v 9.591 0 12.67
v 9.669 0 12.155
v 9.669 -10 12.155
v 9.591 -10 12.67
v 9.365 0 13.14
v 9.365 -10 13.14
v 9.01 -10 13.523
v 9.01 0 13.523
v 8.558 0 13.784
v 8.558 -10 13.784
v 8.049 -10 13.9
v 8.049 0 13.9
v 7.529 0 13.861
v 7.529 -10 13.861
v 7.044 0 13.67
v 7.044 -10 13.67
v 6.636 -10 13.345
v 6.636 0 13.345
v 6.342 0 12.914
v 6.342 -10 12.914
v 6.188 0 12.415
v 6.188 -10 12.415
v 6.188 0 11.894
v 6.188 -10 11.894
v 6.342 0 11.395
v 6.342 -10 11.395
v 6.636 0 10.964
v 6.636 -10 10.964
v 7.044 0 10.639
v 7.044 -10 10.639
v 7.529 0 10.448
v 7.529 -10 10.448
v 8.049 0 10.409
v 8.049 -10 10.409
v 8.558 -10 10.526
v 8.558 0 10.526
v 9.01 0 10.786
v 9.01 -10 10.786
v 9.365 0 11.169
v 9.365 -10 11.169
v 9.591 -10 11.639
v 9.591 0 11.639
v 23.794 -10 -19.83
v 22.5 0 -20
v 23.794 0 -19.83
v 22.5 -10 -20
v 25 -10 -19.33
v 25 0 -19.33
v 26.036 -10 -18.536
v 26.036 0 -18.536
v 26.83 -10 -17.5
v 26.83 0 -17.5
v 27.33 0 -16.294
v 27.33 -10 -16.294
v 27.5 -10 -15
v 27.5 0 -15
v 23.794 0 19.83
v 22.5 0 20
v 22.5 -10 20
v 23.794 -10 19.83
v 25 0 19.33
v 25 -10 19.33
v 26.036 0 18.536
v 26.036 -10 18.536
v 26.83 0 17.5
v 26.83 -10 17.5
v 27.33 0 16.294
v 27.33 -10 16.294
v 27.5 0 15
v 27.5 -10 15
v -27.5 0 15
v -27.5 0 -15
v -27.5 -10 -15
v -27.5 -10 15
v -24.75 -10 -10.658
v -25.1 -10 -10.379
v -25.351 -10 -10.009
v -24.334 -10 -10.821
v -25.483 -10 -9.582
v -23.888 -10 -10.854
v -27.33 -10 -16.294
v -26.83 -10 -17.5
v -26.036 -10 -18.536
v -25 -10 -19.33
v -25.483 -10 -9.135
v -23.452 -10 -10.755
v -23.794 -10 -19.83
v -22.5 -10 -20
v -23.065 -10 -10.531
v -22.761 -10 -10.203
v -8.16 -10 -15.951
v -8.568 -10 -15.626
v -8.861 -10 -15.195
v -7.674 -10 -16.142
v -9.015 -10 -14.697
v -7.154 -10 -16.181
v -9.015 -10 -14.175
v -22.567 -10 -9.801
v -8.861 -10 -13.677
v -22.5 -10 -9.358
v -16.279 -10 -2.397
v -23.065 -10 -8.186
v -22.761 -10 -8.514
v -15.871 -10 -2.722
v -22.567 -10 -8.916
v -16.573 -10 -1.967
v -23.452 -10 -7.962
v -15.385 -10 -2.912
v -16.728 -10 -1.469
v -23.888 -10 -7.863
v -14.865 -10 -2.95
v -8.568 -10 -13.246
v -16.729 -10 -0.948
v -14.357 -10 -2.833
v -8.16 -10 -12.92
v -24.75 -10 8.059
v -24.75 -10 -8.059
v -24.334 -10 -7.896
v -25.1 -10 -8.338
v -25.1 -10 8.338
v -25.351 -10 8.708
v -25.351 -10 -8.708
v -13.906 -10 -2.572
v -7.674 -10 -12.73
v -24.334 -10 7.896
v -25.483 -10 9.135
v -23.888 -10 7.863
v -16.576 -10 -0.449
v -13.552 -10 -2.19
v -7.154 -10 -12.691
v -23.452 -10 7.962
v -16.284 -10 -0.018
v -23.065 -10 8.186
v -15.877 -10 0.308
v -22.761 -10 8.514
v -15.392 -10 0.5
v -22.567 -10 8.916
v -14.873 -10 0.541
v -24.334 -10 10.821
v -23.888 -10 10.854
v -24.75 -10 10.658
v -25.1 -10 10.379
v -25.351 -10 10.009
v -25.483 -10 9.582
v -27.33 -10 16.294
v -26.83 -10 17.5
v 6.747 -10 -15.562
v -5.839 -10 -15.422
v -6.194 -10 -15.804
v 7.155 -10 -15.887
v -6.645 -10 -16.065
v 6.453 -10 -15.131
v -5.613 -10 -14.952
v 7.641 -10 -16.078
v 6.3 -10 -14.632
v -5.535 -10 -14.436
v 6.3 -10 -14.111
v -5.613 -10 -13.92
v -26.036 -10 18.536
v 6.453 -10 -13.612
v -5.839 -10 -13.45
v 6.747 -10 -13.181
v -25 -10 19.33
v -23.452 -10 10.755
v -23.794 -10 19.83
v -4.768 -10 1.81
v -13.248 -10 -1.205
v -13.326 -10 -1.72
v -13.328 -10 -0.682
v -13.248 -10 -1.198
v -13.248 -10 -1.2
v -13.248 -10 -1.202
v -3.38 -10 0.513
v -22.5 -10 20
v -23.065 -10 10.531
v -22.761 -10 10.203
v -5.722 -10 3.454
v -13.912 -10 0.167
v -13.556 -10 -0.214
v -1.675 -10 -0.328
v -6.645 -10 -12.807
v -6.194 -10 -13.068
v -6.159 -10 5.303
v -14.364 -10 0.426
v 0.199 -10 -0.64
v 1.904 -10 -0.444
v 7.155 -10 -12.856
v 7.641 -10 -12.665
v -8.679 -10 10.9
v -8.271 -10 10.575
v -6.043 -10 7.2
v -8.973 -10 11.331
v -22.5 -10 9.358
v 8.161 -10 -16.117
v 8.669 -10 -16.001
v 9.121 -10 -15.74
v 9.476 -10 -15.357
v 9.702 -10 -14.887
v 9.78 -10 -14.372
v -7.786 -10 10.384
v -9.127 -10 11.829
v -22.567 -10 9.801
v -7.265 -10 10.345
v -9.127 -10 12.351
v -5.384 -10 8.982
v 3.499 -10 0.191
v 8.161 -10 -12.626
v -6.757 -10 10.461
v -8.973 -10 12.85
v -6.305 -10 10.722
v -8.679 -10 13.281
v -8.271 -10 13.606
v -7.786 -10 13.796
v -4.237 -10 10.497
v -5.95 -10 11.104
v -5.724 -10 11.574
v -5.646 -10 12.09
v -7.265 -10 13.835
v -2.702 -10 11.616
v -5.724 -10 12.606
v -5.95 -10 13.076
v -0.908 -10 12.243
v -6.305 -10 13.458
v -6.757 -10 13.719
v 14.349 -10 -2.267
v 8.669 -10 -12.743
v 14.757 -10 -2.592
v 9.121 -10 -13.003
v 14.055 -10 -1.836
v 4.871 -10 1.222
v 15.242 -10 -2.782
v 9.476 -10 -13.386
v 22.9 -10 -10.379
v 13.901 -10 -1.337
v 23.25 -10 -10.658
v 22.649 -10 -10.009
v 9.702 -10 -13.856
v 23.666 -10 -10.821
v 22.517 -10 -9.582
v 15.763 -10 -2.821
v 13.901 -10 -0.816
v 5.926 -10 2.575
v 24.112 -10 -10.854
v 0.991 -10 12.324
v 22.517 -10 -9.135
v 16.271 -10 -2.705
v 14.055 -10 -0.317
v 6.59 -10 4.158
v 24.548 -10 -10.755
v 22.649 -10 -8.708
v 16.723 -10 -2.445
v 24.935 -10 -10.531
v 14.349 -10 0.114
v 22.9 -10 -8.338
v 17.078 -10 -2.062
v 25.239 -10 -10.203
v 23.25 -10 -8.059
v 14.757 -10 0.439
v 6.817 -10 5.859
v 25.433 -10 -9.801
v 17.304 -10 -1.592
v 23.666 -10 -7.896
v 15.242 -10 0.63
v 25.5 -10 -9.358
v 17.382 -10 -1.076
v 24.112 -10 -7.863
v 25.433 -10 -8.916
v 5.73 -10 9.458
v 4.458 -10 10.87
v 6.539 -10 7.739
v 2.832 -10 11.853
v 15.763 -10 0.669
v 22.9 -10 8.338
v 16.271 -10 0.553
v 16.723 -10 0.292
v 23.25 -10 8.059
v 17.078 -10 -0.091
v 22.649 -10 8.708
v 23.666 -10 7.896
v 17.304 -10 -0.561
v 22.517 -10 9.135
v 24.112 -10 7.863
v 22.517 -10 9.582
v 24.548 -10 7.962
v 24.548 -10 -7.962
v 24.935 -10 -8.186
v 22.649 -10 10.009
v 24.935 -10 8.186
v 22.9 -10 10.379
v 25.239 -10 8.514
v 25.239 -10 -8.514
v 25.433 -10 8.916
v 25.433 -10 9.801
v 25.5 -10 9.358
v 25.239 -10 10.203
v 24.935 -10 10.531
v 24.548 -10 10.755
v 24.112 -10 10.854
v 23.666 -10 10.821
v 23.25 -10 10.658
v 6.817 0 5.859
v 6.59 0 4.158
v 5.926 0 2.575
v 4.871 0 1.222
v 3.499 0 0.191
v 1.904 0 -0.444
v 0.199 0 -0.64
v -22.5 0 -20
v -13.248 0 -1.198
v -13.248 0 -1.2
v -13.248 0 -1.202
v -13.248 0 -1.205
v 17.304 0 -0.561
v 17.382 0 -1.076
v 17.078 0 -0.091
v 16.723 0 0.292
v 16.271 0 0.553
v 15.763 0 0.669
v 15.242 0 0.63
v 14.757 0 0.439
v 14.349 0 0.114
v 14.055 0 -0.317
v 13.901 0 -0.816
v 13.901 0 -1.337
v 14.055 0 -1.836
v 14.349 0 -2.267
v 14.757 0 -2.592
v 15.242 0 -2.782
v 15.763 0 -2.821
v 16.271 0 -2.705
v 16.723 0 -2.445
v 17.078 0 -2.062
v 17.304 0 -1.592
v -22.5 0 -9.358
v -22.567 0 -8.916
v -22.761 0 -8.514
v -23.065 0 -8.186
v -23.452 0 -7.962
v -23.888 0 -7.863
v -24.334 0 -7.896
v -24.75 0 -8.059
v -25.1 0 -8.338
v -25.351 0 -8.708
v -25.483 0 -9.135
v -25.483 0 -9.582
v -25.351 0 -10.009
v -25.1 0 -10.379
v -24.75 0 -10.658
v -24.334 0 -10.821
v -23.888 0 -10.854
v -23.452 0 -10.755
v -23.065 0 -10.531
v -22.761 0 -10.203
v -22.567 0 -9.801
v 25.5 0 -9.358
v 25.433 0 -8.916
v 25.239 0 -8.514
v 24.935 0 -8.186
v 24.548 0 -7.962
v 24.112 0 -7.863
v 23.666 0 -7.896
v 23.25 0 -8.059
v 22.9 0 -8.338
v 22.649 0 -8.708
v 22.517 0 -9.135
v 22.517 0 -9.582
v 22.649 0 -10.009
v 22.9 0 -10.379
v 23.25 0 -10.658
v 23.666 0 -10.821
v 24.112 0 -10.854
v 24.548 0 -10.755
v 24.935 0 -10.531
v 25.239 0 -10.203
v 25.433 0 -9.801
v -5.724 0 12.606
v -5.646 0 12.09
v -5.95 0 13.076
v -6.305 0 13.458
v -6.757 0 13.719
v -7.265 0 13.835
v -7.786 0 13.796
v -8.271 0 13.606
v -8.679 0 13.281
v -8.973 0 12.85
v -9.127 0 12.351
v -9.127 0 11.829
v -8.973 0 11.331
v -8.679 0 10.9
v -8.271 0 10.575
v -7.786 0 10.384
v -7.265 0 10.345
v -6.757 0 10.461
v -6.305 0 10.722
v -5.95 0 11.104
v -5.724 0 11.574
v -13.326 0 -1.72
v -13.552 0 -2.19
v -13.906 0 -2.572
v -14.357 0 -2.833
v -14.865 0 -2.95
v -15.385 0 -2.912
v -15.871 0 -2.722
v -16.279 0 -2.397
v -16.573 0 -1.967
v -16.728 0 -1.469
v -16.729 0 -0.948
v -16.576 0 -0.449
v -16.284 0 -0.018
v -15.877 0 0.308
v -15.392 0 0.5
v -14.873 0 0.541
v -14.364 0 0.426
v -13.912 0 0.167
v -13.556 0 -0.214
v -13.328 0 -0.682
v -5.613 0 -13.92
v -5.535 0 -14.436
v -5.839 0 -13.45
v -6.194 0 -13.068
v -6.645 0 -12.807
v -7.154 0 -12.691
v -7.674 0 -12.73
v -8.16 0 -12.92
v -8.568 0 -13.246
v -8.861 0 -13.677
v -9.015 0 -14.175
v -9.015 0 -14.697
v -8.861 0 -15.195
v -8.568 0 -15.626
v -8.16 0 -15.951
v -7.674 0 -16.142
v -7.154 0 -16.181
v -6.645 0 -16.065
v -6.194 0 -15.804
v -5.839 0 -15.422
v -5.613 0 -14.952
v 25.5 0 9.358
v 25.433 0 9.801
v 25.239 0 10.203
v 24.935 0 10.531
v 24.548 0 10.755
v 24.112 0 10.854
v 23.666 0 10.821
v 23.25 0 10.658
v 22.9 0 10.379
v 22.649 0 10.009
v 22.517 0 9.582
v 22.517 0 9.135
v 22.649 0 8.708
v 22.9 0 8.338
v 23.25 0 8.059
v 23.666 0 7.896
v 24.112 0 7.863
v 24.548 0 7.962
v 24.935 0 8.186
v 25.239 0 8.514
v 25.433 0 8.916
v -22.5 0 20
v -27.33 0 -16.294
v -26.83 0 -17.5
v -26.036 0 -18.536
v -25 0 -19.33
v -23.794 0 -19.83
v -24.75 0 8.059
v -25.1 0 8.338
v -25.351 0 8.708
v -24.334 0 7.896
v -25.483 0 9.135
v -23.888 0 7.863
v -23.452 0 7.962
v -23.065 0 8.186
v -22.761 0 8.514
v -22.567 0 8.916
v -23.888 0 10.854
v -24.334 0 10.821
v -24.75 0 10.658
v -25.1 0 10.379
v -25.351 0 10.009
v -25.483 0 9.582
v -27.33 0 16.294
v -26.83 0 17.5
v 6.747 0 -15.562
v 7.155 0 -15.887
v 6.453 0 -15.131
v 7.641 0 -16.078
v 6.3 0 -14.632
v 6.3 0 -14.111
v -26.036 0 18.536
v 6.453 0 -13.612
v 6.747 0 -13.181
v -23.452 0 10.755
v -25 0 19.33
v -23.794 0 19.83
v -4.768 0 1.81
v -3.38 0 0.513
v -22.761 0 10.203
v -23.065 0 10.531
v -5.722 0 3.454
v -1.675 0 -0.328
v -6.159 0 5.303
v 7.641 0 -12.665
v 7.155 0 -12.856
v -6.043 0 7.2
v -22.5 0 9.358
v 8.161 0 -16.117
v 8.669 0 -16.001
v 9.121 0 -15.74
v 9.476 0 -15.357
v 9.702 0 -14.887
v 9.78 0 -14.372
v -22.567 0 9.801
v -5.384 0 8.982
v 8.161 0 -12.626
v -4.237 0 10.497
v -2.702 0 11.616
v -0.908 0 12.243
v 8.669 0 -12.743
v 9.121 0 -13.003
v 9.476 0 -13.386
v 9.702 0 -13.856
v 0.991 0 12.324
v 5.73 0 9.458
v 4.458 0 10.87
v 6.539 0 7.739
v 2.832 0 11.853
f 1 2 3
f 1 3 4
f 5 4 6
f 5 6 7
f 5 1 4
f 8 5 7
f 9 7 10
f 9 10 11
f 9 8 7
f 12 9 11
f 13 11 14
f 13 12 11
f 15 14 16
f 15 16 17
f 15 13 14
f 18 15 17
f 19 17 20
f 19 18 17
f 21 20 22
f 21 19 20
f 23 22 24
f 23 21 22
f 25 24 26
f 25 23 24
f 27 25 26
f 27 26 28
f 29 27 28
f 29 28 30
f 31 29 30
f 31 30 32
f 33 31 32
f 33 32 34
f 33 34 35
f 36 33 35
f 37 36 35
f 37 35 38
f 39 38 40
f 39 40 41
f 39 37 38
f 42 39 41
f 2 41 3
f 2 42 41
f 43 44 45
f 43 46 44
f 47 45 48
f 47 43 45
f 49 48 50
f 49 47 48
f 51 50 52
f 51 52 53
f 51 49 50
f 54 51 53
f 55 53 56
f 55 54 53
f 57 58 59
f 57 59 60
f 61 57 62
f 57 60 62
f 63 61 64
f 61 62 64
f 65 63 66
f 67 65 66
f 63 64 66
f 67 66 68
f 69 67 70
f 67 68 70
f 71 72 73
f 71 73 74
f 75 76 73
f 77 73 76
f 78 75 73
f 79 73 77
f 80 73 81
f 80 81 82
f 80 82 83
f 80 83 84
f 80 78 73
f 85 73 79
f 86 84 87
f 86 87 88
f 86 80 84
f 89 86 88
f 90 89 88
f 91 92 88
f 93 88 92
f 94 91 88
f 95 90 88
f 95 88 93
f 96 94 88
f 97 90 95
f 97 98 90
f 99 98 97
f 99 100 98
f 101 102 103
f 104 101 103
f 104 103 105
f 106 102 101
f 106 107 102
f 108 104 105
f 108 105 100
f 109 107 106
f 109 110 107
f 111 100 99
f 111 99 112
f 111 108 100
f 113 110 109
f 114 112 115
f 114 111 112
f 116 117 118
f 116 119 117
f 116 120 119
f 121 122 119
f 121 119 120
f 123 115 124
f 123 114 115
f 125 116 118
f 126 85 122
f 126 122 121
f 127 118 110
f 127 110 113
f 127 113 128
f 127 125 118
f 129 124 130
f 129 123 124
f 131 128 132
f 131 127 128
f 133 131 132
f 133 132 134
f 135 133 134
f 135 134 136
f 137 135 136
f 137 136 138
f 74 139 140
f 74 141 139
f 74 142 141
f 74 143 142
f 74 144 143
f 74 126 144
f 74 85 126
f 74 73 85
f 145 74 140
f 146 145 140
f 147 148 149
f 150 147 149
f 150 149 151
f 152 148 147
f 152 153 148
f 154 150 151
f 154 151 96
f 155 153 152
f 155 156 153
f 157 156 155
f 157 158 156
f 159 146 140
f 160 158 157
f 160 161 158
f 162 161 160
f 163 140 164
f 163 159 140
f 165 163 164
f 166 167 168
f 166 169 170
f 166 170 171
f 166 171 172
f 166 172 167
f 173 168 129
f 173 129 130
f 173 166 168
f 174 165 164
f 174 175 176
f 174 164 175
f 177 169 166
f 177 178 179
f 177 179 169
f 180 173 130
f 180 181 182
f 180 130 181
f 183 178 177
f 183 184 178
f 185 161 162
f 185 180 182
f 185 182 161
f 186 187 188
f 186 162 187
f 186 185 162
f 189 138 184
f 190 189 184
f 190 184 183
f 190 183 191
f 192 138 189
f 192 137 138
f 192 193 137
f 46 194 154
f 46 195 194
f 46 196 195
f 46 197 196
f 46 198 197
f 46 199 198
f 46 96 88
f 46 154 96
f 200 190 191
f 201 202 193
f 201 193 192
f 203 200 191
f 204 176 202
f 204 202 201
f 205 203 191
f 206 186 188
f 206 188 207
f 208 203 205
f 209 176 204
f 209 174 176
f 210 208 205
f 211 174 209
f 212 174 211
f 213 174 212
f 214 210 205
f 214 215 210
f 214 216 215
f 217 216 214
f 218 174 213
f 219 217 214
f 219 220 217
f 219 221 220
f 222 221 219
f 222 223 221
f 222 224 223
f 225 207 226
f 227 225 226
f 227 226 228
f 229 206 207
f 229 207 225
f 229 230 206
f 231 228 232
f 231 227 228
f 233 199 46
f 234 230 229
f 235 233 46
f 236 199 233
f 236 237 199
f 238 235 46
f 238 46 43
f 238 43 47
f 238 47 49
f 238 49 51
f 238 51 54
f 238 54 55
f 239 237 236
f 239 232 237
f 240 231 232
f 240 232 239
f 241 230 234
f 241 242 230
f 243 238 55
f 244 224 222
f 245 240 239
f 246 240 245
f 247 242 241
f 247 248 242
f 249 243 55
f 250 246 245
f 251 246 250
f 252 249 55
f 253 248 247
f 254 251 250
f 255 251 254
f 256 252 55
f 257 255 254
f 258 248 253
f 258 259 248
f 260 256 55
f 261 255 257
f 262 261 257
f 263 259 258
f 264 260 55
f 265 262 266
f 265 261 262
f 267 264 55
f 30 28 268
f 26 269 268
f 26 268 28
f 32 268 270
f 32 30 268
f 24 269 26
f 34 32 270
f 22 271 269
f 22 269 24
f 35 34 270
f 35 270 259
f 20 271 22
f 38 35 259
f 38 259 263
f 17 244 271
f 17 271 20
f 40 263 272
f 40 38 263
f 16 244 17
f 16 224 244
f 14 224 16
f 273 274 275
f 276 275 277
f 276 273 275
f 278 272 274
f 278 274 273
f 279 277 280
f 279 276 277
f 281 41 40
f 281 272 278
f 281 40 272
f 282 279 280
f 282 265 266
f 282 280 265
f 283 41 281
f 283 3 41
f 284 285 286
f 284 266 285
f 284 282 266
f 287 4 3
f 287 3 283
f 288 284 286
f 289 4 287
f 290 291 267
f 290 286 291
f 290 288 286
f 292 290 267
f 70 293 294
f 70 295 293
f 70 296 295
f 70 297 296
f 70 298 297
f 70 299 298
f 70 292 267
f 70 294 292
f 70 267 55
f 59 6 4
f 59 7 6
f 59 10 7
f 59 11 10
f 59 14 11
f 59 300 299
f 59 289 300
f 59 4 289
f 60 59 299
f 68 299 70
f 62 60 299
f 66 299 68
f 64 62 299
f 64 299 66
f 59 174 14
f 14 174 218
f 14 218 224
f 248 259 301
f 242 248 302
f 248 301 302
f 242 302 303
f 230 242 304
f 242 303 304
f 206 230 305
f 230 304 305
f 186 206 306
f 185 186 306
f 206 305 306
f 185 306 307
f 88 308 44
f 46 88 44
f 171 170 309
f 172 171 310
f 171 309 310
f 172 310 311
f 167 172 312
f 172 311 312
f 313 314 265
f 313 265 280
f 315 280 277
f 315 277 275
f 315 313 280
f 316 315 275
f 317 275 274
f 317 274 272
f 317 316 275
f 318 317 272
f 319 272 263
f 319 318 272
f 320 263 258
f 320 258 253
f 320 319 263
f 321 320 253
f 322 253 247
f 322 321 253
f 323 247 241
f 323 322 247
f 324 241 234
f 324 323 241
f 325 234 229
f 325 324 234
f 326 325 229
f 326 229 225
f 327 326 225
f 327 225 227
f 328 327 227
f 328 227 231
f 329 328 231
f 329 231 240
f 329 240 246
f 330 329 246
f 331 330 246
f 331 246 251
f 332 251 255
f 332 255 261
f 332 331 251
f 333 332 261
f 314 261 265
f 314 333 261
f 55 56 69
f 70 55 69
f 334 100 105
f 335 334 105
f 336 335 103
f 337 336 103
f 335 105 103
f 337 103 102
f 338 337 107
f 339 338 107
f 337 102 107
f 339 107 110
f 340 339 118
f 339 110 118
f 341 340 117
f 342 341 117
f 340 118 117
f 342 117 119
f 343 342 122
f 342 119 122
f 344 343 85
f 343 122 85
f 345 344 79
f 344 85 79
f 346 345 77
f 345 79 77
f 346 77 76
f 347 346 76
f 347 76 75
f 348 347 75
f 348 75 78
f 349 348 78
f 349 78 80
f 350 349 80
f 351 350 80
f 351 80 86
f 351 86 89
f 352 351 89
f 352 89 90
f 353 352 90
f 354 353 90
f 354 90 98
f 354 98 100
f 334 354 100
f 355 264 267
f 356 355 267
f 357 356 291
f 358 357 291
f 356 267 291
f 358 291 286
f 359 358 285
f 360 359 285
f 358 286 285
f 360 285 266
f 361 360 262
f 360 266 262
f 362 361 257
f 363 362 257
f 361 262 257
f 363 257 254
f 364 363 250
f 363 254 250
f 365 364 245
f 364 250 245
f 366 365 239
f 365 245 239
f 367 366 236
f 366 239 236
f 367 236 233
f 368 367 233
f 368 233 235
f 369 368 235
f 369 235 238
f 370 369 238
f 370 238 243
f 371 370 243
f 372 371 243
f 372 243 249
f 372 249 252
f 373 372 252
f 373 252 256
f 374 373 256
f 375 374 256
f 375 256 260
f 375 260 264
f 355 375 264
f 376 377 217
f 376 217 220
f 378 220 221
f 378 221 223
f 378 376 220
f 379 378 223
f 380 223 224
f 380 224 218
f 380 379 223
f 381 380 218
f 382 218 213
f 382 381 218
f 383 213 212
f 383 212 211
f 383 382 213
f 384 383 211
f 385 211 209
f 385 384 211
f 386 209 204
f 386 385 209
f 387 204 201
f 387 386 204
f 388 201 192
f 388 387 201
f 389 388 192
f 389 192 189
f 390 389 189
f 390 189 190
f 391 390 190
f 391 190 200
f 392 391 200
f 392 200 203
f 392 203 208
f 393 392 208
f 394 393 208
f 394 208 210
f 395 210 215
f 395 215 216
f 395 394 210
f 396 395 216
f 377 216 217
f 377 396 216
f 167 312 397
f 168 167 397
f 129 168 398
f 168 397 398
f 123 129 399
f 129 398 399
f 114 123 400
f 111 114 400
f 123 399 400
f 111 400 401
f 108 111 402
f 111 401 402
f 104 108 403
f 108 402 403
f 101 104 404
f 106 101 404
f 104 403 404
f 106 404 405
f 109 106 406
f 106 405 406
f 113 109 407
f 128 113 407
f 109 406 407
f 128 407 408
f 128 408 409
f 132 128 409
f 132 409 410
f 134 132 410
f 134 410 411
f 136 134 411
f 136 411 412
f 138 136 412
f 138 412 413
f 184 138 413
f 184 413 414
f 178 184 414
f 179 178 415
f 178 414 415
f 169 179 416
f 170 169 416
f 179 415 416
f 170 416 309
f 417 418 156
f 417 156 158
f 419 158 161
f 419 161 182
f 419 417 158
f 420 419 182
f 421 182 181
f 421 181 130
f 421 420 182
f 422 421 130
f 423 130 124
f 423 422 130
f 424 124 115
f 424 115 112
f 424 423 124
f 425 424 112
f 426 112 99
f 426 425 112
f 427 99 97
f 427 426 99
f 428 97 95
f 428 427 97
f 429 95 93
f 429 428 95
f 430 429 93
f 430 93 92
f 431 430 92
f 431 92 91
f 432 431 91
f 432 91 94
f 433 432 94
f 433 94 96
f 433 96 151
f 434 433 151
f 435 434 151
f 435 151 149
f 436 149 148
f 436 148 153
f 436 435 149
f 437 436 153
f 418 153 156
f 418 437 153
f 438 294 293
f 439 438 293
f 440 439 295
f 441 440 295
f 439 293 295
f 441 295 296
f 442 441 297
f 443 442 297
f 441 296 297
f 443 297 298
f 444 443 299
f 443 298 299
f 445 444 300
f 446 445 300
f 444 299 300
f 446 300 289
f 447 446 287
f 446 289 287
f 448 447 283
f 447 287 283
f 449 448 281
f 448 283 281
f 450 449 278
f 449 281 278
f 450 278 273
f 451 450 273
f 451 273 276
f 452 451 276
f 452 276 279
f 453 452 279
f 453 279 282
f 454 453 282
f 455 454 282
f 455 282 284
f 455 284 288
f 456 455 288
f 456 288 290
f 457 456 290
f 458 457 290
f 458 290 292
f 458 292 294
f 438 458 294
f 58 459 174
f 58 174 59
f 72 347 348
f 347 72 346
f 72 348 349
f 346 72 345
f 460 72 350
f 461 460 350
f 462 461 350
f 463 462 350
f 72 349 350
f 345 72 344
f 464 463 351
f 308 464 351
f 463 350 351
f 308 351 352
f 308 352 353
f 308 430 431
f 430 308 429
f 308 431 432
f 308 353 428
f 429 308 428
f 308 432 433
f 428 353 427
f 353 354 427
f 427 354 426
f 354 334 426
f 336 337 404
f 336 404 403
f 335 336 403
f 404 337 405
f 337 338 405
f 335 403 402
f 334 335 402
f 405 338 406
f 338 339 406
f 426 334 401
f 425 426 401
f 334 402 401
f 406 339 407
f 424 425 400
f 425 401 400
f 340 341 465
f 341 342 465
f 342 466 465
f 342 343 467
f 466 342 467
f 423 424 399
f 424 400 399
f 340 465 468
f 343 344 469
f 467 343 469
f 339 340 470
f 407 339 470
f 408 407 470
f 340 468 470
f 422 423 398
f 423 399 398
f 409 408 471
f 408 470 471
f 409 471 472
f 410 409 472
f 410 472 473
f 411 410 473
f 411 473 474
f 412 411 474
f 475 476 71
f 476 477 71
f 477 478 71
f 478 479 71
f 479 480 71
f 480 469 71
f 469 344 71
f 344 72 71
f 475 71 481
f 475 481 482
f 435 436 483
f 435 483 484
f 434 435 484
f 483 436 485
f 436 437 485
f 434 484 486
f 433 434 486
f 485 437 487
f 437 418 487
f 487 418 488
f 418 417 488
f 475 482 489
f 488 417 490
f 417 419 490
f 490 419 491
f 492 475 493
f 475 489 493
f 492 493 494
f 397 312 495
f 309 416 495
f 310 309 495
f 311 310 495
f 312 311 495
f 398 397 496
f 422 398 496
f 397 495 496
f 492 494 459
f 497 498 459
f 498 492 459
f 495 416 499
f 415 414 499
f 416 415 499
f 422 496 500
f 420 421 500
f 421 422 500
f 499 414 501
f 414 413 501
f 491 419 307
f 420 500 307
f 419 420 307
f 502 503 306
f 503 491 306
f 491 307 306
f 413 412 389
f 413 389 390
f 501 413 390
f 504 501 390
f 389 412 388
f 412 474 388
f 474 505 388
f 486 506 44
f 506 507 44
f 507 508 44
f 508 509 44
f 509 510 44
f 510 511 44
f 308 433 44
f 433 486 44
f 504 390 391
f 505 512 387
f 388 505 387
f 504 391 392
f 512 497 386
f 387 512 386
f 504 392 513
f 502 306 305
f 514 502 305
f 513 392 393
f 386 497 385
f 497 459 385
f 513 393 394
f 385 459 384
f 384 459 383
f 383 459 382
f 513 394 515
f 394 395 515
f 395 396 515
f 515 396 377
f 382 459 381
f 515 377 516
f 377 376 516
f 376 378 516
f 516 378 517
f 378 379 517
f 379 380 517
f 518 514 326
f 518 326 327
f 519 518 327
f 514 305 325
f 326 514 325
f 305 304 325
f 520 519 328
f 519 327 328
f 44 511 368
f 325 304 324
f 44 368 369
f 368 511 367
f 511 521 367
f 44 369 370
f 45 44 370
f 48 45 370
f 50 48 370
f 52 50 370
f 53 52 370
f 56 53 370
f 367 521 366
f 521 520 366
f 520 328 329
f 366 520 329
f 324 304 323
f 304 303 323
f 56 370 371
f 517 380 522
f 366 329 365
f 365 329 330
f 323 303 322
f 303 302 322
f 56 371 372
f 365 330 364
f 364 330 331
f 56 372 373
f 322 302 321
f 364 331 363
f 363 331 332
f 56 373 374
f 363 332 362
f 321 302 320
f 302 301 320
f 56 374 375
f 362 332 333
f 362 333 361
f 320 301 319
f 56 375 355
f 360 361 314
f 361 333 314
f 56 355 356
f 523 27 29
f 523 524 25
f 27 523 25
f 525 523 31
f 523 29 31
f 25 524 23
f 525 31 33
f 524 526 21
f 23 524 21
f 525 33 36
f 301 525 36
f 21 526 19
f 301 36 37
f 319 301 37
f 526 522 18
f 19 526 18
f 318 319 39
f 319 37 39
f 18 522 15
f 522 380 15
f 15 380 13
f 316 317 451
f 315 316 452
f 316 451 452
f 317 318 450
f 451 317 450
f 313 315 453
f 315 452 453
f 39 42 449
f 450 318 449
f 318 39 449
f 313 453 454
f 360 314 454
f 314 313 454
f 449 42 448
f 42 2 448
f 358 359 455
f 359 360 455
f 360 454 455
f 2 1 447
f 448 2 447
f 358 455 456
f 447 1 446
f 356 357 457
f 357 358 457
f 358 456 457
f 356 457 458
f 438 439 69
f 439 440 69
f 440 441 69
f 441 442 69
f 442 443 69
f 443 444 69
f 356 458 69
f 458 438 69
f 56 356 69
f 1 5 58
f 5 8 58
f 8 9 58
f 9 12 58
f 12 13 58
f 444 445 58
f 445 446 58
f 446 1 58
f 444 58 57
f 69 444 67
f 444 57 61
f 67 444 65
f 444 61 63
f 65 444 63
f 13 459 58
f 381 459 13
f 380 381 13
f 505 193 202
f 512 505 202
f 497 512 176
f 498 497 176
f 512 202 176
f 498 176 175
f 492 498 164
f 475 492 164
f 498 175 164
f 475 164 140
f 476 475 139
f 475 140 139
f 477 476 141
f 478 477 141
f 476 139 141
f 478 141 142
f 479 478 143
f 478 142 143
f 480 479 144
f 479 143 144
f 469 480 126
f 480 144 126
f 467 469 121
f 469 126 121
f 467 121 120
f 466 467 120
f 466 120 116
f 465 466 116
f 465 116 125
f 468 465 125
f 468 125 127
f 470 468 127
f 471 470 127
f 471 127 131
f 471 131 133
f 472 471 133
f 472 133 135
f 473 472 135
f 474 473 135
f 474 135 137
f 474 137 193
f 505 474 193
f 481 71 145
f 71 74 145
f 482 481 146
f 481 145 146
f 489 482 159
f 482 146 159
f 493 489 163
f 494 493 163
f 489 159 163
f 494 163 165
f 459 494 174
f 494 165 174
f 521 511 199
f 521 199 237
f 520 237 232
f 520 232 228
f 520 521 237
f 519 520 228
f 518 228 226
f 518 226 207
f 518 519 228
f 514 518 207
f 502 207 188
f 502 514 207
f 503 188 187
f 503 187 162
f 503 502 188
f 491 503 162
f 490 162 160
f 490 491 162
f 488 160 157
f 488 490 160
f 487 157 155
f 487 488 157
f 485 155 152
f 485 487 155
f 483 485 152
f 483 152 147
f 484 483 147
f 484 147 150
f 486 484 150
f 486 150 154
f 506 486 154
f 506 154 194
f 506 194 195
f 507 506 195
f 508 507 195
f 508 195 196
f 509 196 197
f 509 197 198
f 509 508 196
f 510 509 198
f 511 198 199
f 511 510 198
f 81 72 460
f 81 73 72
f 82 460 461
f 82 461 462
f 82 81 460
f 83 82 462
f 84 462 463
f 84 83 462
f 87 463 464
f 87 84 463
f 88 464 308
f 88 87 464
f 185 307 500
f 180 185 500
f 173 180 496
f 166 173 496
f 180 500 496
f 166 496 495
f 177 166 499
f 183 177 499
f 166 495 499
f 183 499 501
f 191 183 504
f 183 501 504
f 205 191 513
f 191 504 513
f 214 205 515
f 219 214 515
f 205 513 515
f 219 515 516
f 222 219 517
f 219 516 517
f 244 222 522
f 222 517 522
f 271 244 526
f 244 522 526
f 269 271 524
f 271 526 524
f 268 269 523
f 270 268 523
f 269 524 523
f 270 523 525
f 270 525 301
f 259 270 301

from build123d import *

# Parameters (mm, degrees)
F0_W     = 55
F0_H     = 40
F0_R     = 1.75
F1_DEPTH = 10
F2_R     = 5
F3_R     = 1.5
F4_DEPTH = 25


with BuildPart() as f1:
    # F0 (on Front) → F1 (new body)
    with BuildSketch(Plane.XZ):
        Rectangle(F0_W, F0_H)
        with Locations((-7.2848021371, -14.4358355429)):
            Circle(F0_R, mode=Mode.SUBTRACT)
        with BuildLine():
            ThreePointArc((-13.2479269502, -1.1975721574), (-13.2479153857, -1.2012452699), (-13.2479115309, -1.2049183986))
            ThreePointArc((-13.2479115309, -1.2049183986), (-16.7479076761, -1.2085915273), (-13.2479269502, -1.1975721574))
        make_face(mode=Mode.SUBTRACT)
        with Locations((8.0300629221, -14.3715454379)):
            Circle(F0_R, mode=Mode.SUBTRACT)
        with Locations((15.6318185876, -1.0763381886)):
            Circle(F0_R, mode=Mode.SUBTRACT)
        with Locations((-7.3961558654, 12.0902888507)):
            Circle(F0_R, mode=Mode.SUBTRACT)
        with BuildLine():
            ThreePointArc((6.8169535283, 5.8593717064), (4.871273383, 1.2216814773), (0.1990548634, -0.6395589675))
            ThreePointArc((0.1990548634, -0.6395589675), (-4.2373663264, 10.4970619355), (6.8169535283, 5.8593717064))
        make_face(mode=Mode.SUBTRACT)
        with Locations((7.9187091938, 12.1545789557)):
            Circle(F0_R, mode=Mode.SUBTRACT)
    extrude(amount=F1_DEPTH)

    # F2
    f2_edges = [f1.edges().sort_by_distance(p)[0] for p in [
        (-27.5, -5, 20),
        (-27.5, -5, -20),
        (27.5, -5, -20),
        (27.5, -5, 20),
    ]]
    fillet(f2_edges, radius=F2_R)

    # F3 (on face) → F4 (cut)
    with BuildSketch(Plane.XZ.offset(10)):
        with Locations((-24, 9.3585)):
            Circle(F3_R)
        with Locations((-24, -9.3585)):
            Circle(F3_R)
        with Locations((24, 9.3585)):
            Circle(F3_R)
        with Locations((24, -9.3585)):
            Circle(F3_R)
    extrude(amount=-F4_DEPTH, mode=Mode.SUBTRACT)


solid = f1.part
